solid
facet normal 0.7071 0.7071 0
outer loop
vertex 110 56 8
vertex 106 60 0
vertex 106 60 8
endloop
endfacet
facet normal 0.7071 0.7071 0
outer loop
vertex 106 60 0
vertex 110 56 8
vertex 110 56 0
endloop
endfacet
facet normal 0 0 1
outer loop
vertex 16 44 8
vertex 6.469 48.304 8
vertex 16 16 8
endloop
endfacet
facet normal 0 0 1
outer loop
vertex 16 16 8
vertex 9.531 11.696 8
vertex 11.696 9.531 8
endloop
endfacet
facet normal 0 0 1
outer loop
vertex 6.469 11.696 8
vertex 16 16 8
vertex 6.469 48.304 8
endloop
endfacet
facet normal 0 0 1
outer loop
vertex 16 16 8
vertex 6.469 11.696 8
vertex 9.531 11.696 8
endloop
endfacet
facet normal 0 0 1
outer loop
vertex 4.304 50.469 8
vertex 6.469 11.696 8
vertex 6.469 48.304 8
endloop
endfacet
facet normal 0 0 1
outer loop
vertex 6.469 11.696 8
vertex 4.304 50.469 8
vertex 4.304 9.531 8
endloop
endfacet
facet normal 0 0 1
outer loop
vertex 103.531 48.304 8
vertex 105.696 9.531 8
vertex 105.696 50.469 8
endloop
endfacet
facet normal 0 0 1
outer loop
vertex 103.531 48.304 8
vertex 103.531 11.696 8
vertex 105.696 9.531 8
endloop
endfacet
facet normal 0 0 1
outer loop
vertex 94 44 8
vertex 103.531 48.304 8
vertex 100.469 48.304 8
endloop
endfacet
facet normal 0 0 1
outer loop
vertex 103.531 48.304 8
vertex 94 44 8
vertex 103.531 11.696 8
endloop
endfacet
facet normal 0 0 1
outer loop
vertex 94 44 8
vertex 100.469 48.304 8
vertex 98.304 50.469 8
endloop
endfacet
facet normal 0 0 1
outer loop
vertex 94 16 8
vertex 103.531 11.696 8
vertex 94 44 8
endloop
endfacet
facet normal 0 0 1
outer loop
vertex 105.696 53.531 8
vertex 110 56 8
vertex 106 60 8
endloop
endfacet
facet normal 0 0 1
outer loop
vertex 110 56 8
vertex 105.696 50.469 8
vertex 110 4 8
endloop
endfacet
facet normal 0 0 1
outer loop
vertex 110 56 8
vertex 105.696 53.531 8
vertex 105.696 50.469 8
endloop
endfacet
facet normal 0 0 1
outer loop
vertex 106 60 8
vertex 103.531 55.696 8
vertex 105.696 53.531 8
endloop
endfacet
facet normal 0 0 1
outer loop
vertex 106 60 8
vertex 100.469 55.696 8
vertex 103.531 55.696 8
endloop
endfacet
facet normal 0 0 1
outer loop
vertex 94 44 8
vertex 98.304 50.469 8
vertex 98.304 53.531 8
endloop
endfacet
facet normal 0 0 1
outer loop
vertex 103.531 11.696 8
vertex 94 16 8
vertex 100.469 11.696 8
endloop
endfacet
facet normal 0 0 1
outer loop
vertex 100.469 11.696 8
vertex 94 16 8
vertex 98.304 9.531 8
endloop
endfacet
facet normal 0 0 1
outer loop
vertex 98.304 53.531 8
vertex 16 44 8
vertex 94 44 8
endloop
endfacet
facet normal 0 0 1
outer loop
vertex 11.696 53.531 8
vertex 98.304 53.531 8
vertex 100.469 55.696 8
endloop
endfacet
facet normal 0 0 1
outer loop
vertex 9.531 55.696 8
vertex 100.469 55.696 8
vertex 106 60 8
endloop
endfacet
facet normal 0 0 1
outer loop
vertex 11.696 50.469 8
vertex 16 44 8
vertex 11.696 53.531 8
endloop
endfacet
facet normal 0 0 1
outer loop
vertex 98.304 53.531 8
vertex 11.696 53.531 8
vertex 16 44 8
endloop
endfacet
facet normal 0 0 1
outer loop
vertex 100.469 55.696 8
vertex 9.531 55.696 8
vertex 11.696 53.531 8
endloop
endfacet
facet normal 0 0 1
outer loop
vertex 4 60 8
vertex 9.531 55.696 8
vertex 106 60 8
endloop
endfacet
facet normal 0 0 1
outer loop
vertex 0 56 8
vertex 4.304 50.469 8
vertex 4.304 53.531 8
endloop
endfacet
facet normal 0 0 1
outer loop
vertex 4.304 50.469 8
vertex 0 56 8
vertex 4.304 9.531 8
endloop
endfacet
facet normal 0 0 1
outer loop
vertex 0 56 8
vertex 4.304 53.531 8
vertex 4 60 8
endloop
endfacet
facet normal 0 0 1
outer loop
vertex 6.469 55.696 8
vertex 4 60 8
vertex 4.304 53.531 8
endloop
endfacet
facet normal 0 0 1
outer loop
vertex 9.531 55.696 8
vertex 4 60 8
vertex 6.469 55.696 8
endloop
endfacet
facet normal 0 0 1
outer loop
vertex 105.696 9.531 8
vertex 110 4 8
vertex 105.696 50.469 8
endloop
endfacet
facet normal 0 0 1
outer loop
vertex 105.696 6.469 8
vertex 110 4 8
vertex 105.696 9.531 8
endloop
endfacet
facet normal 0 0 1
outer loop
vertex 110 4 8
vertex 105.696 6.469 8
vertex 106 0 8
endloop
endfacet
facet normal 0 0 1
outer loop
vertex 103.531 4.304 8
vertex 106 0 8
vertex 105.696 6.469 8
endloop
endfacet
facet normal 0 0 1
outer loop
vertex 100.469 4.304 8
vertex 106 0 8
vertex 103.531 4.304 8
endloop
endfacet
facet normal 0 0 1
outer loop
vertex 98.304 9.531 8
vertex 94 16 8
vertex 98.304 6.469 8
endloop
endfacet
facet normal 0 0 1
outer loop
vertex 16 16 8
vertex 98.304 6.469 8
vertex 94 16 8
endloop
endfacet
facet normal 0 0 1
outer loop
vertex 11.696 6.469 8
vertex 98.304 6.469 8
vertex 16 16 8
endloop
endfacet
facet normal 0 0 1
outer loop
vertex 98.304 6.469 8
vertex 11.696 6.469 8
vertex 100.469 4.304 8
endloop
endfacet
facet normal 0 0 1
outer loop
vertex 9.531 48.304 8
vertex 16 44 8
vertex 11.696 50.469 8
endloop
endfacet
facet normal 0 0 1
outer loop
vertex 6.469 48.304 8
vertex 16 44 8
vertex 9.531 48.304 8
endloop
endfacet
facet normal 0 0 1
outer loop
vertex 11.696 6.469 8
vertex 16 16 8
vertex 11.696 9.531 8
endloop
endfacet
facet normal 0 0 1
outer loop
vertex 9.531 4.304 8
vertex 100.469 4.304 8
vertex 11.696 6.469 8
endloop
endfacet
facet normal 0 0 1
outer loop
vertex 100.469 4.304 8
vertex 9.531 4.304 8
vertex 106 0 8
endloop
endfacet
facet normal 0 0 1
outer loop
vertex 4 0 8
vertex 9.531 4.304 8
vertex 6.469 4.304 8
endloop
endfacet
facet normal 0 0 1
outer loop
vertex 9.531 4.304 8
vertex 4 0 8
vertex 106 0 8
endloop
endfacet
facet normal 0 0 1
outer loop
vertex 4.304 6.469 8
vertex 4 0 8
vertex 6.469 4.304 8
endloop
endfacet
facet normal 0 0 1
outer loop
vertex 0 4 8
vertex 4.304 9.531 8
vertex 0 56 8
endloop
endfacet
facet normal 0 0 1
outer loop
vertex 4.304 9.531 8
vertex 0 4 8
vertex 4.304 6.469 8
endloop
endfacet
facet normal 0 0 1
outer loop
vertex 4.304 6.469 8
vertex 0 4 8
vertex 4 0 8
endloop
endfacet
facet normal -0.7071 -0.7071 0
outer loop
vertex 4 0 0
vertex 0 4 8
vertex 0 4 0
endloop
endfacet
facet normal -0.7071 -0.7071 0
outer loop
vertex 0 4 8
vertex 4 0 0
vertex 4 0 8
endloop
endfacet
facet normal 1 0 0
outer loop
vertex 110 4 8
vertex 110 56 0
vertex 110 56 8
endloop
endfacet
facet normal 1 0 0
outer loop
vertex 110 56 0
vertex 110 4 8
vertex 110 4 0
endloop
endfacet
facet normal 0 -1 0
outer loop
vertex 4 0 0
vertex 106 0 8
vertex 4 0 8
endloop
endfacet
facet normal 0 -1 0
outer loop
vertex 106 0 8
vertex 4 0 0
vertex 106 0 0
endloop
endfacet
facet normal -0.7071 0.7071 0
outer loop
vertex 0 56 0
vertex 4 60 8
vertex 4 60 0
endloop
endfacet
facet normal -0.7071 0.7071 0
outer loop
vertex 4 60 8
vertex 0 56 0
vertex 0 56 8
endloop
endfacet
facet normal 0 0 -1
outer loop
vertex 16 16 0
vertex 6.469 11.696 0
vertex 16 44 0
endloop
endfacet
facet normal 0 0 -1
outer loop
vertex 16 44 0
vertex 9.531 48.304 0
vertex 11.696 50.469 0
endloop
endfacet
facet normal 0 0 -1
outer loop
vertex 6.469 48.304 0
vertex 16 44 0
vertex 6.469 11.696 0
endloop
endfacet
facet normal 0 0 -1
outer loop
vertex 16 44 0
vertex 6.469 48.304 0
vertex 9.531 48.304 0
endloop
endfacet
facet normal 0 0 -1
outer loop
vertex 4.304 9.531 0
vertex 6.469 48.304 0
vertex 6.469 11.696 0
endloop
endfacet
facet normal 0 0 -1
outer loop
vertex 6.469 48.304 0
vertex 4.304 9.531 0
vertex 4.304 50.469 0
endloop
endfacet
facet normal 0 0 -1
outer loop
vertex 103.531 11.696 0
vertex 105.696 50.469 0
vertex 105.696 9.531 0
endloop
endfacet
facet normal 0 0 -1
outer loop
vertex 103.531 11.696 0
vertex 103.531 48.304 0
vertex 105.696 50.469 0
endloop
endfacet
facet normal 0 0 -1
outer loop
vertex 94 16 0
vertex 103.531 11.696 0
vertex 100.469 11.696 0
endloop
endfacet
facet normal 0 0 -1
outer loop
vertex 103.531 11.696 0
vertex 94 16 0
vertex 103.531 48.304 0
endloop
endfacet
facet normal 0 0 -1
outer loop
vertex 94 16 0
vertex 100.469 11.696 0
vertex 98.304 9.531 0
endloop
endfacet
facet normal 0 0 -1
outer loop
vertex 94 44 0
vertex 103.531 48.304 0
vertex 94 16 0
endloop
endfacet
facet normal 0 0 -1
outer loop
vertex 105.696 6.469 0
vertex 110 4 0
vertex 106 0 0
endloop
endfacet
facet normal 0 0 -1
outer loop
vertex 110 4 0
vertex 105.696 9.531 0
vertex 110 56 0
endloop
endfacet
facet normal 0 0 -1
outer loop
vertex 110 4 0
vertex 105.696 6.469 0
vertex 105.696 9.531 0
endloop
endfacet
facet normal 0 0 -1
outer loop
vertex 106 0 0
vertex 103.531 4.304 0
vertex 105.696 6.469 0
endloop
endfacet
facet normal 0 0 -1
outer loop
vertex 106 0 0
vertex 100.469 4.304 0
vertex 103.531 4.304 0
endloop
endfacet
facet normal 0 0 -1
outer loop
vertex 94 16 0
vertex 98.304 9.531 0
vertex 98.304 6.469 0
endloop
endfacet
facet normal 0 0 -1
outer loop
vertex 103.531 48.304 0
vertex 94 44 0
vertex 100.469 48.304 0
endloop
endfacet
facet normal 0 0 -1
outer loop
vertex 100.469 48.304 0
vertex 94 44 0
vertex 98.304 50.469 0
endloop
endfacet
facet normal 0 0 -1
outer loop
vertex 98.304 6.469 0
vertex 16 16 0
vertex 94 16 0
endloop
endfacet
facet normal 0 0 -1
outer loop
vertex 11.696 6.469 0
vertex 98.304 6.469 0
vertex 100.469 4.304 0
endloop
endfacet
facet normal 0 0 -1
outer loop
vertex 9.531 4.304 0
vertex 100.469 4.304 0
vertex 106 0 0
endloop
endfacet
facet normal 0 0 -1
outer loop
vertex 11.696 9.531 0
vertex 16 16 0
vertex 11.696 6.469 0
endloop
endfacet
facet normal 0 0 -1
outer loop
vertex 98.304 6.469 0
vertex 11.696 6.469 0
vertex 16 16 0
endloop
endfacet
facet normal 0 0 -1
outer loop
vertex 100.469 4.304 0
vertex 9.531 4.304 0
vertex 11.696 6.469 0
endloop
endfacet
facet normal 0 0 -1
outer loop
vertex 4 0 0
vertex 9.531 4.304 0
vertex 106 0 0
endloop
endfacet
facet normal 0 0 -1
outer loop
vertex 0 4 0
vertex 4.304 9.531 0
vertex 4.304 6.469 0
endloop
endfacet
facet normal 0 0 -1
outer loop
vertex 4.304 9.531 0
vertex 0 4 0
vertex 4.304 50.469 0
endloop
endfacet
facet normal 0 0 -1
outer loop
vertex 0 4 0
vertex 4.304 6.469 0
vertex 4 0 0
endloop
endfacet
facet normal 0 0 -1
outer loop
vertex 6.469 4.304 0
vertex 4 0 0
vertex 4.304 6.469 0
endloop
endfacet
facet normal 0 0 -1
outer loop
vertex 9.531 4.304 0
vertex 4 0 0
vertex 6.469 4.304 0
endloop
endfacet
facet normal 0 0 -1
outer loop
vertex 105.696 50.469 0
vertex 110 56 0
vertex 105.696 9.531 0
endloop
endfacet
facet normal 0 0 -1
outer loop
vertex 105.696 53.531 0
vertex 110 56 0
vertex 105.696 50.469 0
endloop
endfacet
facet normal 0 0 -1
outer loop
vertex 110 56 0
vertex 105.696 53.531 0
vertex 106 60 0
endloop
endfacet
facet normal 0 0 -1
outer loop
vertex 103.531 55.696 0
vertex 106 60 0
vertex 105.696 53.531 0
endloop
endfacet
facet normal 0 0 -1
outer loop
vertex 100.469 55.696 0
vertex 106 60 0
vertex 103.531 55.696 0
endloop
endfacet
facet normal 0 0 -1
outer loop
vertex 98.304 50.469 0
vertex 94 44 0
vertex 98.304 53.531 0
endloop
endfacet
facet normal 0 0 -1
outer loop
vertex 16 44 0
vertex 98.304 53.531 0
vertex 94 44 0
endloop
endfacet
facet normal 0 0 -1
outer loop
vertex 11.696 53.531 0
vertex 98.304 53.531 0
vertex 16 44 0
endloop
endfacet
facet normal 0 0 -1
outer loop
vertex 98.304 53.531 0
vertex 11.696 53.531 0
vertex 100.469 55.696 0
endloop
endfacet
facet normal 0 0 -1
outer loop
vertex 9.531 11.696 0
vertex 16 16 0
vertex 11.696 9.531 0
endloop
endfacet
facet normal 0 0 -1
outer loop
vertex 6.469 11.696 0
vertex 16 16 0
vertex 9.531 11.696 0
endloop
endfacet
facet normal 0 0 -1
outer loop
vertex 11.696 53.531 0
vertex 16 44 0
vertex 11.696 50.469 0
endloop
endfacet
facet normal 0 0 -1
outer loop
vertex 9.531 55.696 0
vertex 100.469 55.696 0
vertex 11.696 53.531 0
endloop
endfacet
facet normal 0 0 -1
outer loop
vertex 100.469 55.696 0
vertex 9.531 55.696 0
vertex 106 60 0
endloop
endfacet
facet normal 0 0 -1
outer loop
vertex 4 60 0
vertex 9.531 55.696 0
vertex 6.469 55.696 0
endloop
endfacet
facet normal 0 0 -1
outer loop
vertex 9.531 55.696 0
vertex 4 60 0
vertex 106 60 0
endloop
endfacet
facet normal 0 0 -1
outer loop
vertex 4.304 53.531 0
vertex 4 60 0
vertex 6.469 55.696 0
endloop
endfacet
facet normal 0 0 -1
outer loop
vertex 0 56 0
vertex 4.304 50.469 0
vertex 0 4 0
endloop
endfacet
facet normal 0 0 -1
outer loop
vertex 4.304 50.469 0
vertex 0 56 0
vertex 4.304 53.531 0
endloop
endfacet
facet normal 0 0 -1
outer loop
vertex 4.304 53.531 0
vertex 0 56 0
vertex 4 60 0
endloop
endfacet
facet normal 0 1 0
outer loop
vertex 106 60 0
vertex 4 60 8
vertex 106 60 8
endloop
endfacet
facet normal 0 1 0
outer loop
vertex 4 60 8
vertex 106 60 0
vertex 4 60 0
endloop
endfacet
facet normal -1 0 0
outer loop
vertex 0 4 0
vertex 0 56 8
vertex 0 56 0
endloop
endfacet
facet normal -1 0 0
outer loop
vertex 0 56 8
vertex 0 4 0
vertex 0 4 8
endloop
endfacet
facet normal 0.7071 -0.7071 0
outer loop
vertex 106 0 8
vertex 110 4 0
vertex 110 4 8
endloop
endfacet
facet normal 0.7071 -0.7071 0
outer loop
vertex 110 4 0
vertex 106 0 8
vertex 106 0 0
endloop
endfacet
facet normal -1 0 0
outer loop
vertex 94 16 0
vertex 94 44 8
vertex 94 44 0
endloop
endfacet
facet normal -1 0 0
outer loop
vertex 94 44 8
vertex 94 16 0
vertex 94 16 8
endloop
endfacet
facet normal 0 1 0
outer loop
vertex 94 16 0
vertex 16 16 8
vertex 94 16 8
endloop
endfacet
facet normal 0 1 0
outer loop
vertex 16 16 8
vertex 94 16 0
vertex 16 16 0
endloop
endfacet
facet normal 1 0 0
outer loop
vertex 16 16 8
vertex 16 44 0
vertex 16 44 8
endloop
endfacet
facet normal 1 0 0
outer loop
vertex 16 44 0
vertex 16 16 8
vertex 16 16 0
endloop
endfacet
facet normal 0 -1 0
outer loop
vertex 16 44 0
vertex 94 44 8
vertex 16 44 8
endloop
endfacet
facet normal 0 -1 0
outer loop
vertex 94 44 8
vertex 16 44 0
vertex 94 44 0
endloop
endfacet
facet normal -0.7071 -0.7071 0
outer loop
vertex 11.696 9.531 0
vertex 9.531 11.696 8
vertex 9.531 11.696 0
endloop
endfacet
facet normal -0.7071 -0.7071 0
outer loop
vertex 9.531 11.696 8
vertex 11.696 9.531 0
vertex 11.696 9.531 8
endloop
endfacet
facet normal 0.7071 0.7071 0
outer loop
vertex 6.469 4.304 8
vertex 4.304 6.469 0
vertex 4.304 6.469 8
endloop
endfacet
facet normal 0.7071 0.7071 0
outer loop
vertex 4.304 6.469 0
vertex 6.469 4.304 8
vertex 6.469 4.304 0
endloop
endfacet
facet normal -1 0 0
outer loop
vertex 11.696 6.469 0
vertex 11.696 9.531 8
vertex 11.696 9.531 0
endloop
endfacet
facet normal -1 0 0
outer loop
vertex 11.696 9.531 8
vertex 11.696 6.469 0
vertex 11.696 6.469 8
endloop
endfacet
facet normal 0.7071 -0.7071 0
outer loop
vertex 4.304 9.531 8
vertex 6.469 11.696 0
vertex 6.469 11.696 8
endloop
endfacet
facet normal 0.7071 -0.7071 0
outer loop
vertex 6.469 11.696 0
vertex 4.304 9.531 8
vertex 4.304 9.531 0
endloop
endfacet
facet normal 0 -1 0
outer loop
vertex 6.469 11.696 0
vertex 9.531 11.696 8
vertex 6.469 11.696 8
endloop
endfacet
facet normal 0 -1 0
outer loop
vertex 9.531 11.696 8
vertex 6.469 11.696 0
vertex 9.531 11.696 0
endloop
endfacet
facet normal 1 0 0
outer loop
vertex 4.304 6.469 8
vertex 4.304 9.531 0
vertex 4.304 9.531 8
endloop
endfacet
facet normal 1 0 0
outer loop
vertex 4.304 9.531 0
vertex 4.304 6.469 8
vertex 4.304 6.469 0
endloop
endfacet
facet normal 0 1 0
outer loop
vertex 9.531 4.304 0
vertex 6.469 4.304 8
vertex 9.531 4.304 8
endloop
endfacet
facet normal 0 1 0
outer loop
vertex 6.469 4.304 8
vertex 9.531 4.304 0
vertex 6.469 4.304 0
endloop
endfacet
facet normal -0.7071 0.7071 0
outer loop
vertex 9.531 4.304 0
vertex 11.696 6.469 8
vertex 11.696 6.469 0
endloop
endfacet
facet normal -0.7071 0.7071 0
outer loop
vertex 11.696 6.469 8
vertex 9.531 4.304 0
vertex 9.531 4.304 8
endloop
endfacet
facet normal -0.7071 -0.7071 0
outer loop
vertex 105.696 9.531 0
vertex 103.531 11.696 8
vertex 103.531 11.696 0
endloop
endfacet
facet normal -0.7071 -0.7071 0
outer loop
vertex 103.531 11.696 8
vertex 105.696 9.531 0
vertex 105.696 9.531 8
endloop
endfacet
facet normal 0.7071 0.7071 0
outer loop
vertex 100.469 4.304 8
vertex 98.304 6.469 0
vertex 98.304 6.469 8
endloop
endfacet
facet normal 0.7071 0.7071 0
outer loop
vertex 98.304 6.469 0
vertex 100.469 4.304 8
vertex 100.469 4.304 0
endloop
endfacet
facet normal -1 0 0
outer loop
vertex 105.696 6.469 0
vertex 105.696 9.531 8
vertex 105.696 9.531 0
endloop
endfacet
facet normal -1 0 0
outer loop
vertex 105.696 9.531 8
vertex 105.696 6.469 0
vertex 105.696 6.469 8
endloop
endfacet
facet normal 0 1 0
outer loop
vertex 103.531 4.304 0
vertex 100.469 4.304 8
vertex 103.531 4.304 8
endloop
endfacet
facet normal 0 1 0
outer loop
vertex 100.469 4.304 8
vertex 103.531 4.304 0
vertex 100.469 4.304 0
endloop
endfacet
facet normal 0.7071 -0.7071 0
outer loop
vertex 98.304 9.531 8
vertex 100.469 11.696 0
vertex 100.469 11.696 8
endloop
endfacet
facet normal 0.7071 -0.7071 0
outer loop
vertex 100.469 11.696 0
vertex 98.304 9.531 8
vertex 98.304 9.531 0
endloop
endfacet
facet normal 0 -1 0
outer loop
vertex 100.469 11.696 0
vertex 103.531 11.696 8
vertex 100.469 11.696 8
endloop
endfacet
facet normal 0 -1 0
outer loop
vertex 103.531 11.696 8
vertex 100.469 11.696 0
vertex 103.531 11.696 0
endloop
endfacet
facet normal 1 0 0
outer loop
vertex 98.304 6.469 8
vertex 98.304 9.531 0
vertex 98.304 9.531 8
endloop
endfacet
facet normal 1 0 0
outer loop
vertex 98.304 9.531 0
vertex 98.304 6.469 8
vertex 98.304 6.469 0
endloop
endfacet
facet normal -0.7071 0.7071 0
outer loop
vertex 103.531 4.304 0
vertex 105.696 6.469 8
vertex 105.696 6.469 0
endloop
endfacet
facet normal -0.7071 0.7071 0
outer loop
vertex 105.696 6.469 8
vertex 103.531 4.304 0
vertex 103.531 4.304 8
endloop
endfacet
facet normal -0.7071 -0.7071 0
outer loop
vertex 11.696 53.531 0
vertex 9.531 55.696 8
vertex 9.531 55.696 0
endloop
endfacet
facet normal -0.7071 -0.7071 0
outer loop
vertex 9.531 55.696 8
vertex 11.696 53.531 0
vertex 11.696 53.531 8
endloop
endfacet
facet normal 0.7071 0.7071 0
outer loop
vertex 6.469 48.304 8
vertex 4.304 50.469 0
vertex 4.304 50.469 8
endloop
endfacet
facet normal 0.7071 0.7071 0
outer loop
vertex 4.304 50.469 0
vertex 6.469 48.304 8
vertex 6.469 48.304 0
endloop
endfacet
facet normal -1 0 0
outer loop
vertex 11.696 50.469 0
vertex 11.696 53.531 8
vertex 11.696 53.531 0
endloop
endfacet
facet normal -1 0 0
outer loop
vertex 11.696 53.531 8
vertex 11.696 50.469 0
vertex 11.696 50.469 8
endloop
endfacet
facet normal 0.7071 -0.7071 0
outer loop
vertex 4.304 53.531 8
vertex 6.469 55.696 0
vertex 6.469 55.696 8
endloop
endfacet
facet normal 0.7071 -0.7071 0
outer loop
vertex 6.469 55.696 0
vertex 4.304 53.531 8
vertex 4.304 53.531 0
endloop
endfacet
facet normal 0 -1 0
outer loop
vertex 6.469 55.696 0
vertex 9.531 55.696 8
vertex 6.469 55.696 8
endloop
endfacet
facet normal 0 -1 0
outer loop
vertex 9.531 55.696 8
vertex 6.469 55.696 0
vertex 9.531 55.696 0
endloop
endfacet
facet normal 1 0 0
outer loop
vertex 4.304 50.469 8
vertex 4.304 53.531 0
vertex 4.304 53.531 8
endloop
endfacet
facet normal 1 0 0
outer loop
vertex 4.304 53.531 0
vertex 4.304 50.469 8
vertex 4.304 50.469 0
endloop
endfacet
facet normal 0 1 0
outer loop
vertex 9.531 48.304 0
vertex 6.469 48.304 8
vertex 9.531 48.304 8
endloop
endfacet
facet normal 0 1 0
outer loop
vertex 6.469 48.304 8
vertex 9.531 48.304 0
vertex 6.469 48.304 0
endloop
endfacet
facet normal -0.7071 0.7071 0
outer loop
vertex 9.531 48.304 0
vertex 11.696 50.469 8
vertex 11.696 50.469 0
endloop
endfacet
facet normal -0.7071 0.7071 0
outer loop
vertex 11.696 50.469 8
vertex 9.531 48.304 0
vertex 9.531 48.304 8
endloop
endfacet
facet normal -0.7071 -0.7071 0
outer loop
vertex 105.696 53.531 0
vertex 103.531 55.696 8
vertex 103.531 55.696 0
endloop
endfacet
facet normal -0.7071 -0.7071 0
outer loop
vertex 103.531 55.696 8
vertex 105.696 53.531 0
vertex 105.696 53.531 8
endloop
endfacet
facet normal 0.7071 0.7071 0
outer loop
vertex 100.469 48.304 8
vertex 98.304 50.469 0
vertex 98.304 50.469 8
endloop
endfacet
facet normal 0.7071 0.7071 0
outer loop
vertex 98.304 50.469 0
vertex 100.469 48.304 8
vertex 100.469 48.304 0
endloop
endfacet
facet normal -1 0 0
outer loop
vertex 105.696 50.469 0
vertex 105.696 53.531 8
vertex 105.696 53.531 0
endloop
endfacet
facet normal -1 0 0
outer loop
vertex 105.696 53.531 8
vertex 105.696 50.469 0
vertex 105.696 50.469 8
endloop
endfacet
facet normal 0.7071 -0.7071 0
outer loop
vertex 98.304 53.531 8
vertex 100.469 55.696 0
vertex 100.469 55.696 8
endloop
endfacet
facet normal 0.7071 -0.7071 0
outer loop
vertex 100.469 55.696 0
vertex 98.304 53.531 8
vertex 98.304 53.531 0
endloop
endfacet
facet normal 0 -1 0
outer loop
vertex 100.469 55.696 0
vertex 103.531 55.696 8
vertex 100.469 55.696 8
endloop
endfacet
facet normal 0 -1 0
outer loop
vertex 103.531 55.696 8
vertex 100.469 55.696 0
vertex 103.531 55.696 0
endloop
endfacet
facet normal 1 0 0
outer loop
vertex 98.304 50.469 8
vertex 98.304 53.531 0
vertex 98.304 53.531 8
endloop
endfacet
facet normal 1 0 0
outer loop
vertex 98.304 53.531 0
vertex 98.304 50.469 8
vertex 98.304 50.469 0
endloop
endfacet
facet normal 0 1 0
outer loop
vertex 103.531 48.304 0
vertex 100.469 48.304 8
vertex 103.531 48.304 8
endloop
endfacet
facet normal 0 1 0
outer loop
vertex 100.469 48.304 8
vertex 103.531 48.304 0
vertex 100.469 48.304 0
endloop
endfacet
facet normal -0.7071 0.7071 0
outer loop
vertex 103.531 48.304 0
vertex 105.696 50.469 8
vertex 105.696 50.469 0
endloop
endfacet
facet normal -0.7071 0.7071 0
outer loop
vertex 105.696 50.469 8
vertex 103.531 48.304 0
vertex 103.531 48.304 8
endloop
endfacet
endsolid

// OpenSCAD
$fn = 32;

// ----------------------------------------------------------------------
// Frame plate: 110 x 60 frame, 16 mm rails
// ----------------------------------------------------------------------

// --- parameters (mm) ---
plate_l = 110;            // plate length, X
plate_w = 60;             // plate width, Y
plate_t = 8;              // plate thickness, Z (extrusion height)
corner_c = 4;             // corner chamfer
frame_bar = 16;           // frame rail width
bolt_r = 4;               // corner bolt window radius
bolt_inset = 8;           // bolt centre inset from the edges

win_l = plate_l - 2 * frame_bar;  // window length
win_w = plate_w - 2 * frame_bar;  // window width
bolt_d = 2 * bolt_r;  // corner hole diameter

profile = [[4, 0], [106, 0], [110, 4], [110, 56], [106, 60], [4, 60], [0, 56], [0, 4]];  // primary outline, 8 points, counter clockwise
void_1 = [[16, 16], [94, 16], [94, 44], [16, 44]];  // the window, 4 points
void_2 = [[11.696, 9.531], [9.531, 11.696], [6.469, 11.696], [4.304, 9.531], [4.304, 6.469], [6.469, 4.304], [9.531, 4.304], [11.696, 6.469]];  // corner bolt window, 8 points
void_3 = [[105.696, 9.531], [103.531, 11.696], [100.469, 11.696], [98.304, 9.531], [98.304, 6.469], [100.469, 4.304], [103.531, 4.304], [105.696, 6.469]];  // corner bolt window, 8 points
void_4 = [[11.696, 53.531], [9.531, 55.696], [6.469, 55.696], [4.304, 53.531], [4.304, 50.469], [6.469, 48.304], [9.531, 48.304], [11.696, 50.469]];  // corner bolt window, 8 points
void_5 = [[105.696, 53.531], [103.531, 55.696], [100.469, 55.696], [98.304, 53.531], [98.304, 50.469], [100.469, 48.304], [103.531, 48.304], [105.696, 50.469]];  // corner bolt window, 8 points

// --- the one profile operation ---
difference() {
  linear_extrude(height = plate_t) polygon(points = profile);
  translate([0, 0, -1])
    linear_extrude(height = plate_t + 2) polygon(points = void_1);
  translate([0, 0, -1])
    linear_extrude(height = plate_t + 2) polygon(points = void_2);
  translate([0, 0, -1])
    linear_extrude(height = plate_t + 2) polygon(points = void_3);
  translate([0, 0, -1])
    linear_extrude(height = plate_t + 2) polygon(points = void_4);
  translate([0, 0, -1])
    linear_extrude(height = plate_t + 2) polygon(points = void_5);
}
